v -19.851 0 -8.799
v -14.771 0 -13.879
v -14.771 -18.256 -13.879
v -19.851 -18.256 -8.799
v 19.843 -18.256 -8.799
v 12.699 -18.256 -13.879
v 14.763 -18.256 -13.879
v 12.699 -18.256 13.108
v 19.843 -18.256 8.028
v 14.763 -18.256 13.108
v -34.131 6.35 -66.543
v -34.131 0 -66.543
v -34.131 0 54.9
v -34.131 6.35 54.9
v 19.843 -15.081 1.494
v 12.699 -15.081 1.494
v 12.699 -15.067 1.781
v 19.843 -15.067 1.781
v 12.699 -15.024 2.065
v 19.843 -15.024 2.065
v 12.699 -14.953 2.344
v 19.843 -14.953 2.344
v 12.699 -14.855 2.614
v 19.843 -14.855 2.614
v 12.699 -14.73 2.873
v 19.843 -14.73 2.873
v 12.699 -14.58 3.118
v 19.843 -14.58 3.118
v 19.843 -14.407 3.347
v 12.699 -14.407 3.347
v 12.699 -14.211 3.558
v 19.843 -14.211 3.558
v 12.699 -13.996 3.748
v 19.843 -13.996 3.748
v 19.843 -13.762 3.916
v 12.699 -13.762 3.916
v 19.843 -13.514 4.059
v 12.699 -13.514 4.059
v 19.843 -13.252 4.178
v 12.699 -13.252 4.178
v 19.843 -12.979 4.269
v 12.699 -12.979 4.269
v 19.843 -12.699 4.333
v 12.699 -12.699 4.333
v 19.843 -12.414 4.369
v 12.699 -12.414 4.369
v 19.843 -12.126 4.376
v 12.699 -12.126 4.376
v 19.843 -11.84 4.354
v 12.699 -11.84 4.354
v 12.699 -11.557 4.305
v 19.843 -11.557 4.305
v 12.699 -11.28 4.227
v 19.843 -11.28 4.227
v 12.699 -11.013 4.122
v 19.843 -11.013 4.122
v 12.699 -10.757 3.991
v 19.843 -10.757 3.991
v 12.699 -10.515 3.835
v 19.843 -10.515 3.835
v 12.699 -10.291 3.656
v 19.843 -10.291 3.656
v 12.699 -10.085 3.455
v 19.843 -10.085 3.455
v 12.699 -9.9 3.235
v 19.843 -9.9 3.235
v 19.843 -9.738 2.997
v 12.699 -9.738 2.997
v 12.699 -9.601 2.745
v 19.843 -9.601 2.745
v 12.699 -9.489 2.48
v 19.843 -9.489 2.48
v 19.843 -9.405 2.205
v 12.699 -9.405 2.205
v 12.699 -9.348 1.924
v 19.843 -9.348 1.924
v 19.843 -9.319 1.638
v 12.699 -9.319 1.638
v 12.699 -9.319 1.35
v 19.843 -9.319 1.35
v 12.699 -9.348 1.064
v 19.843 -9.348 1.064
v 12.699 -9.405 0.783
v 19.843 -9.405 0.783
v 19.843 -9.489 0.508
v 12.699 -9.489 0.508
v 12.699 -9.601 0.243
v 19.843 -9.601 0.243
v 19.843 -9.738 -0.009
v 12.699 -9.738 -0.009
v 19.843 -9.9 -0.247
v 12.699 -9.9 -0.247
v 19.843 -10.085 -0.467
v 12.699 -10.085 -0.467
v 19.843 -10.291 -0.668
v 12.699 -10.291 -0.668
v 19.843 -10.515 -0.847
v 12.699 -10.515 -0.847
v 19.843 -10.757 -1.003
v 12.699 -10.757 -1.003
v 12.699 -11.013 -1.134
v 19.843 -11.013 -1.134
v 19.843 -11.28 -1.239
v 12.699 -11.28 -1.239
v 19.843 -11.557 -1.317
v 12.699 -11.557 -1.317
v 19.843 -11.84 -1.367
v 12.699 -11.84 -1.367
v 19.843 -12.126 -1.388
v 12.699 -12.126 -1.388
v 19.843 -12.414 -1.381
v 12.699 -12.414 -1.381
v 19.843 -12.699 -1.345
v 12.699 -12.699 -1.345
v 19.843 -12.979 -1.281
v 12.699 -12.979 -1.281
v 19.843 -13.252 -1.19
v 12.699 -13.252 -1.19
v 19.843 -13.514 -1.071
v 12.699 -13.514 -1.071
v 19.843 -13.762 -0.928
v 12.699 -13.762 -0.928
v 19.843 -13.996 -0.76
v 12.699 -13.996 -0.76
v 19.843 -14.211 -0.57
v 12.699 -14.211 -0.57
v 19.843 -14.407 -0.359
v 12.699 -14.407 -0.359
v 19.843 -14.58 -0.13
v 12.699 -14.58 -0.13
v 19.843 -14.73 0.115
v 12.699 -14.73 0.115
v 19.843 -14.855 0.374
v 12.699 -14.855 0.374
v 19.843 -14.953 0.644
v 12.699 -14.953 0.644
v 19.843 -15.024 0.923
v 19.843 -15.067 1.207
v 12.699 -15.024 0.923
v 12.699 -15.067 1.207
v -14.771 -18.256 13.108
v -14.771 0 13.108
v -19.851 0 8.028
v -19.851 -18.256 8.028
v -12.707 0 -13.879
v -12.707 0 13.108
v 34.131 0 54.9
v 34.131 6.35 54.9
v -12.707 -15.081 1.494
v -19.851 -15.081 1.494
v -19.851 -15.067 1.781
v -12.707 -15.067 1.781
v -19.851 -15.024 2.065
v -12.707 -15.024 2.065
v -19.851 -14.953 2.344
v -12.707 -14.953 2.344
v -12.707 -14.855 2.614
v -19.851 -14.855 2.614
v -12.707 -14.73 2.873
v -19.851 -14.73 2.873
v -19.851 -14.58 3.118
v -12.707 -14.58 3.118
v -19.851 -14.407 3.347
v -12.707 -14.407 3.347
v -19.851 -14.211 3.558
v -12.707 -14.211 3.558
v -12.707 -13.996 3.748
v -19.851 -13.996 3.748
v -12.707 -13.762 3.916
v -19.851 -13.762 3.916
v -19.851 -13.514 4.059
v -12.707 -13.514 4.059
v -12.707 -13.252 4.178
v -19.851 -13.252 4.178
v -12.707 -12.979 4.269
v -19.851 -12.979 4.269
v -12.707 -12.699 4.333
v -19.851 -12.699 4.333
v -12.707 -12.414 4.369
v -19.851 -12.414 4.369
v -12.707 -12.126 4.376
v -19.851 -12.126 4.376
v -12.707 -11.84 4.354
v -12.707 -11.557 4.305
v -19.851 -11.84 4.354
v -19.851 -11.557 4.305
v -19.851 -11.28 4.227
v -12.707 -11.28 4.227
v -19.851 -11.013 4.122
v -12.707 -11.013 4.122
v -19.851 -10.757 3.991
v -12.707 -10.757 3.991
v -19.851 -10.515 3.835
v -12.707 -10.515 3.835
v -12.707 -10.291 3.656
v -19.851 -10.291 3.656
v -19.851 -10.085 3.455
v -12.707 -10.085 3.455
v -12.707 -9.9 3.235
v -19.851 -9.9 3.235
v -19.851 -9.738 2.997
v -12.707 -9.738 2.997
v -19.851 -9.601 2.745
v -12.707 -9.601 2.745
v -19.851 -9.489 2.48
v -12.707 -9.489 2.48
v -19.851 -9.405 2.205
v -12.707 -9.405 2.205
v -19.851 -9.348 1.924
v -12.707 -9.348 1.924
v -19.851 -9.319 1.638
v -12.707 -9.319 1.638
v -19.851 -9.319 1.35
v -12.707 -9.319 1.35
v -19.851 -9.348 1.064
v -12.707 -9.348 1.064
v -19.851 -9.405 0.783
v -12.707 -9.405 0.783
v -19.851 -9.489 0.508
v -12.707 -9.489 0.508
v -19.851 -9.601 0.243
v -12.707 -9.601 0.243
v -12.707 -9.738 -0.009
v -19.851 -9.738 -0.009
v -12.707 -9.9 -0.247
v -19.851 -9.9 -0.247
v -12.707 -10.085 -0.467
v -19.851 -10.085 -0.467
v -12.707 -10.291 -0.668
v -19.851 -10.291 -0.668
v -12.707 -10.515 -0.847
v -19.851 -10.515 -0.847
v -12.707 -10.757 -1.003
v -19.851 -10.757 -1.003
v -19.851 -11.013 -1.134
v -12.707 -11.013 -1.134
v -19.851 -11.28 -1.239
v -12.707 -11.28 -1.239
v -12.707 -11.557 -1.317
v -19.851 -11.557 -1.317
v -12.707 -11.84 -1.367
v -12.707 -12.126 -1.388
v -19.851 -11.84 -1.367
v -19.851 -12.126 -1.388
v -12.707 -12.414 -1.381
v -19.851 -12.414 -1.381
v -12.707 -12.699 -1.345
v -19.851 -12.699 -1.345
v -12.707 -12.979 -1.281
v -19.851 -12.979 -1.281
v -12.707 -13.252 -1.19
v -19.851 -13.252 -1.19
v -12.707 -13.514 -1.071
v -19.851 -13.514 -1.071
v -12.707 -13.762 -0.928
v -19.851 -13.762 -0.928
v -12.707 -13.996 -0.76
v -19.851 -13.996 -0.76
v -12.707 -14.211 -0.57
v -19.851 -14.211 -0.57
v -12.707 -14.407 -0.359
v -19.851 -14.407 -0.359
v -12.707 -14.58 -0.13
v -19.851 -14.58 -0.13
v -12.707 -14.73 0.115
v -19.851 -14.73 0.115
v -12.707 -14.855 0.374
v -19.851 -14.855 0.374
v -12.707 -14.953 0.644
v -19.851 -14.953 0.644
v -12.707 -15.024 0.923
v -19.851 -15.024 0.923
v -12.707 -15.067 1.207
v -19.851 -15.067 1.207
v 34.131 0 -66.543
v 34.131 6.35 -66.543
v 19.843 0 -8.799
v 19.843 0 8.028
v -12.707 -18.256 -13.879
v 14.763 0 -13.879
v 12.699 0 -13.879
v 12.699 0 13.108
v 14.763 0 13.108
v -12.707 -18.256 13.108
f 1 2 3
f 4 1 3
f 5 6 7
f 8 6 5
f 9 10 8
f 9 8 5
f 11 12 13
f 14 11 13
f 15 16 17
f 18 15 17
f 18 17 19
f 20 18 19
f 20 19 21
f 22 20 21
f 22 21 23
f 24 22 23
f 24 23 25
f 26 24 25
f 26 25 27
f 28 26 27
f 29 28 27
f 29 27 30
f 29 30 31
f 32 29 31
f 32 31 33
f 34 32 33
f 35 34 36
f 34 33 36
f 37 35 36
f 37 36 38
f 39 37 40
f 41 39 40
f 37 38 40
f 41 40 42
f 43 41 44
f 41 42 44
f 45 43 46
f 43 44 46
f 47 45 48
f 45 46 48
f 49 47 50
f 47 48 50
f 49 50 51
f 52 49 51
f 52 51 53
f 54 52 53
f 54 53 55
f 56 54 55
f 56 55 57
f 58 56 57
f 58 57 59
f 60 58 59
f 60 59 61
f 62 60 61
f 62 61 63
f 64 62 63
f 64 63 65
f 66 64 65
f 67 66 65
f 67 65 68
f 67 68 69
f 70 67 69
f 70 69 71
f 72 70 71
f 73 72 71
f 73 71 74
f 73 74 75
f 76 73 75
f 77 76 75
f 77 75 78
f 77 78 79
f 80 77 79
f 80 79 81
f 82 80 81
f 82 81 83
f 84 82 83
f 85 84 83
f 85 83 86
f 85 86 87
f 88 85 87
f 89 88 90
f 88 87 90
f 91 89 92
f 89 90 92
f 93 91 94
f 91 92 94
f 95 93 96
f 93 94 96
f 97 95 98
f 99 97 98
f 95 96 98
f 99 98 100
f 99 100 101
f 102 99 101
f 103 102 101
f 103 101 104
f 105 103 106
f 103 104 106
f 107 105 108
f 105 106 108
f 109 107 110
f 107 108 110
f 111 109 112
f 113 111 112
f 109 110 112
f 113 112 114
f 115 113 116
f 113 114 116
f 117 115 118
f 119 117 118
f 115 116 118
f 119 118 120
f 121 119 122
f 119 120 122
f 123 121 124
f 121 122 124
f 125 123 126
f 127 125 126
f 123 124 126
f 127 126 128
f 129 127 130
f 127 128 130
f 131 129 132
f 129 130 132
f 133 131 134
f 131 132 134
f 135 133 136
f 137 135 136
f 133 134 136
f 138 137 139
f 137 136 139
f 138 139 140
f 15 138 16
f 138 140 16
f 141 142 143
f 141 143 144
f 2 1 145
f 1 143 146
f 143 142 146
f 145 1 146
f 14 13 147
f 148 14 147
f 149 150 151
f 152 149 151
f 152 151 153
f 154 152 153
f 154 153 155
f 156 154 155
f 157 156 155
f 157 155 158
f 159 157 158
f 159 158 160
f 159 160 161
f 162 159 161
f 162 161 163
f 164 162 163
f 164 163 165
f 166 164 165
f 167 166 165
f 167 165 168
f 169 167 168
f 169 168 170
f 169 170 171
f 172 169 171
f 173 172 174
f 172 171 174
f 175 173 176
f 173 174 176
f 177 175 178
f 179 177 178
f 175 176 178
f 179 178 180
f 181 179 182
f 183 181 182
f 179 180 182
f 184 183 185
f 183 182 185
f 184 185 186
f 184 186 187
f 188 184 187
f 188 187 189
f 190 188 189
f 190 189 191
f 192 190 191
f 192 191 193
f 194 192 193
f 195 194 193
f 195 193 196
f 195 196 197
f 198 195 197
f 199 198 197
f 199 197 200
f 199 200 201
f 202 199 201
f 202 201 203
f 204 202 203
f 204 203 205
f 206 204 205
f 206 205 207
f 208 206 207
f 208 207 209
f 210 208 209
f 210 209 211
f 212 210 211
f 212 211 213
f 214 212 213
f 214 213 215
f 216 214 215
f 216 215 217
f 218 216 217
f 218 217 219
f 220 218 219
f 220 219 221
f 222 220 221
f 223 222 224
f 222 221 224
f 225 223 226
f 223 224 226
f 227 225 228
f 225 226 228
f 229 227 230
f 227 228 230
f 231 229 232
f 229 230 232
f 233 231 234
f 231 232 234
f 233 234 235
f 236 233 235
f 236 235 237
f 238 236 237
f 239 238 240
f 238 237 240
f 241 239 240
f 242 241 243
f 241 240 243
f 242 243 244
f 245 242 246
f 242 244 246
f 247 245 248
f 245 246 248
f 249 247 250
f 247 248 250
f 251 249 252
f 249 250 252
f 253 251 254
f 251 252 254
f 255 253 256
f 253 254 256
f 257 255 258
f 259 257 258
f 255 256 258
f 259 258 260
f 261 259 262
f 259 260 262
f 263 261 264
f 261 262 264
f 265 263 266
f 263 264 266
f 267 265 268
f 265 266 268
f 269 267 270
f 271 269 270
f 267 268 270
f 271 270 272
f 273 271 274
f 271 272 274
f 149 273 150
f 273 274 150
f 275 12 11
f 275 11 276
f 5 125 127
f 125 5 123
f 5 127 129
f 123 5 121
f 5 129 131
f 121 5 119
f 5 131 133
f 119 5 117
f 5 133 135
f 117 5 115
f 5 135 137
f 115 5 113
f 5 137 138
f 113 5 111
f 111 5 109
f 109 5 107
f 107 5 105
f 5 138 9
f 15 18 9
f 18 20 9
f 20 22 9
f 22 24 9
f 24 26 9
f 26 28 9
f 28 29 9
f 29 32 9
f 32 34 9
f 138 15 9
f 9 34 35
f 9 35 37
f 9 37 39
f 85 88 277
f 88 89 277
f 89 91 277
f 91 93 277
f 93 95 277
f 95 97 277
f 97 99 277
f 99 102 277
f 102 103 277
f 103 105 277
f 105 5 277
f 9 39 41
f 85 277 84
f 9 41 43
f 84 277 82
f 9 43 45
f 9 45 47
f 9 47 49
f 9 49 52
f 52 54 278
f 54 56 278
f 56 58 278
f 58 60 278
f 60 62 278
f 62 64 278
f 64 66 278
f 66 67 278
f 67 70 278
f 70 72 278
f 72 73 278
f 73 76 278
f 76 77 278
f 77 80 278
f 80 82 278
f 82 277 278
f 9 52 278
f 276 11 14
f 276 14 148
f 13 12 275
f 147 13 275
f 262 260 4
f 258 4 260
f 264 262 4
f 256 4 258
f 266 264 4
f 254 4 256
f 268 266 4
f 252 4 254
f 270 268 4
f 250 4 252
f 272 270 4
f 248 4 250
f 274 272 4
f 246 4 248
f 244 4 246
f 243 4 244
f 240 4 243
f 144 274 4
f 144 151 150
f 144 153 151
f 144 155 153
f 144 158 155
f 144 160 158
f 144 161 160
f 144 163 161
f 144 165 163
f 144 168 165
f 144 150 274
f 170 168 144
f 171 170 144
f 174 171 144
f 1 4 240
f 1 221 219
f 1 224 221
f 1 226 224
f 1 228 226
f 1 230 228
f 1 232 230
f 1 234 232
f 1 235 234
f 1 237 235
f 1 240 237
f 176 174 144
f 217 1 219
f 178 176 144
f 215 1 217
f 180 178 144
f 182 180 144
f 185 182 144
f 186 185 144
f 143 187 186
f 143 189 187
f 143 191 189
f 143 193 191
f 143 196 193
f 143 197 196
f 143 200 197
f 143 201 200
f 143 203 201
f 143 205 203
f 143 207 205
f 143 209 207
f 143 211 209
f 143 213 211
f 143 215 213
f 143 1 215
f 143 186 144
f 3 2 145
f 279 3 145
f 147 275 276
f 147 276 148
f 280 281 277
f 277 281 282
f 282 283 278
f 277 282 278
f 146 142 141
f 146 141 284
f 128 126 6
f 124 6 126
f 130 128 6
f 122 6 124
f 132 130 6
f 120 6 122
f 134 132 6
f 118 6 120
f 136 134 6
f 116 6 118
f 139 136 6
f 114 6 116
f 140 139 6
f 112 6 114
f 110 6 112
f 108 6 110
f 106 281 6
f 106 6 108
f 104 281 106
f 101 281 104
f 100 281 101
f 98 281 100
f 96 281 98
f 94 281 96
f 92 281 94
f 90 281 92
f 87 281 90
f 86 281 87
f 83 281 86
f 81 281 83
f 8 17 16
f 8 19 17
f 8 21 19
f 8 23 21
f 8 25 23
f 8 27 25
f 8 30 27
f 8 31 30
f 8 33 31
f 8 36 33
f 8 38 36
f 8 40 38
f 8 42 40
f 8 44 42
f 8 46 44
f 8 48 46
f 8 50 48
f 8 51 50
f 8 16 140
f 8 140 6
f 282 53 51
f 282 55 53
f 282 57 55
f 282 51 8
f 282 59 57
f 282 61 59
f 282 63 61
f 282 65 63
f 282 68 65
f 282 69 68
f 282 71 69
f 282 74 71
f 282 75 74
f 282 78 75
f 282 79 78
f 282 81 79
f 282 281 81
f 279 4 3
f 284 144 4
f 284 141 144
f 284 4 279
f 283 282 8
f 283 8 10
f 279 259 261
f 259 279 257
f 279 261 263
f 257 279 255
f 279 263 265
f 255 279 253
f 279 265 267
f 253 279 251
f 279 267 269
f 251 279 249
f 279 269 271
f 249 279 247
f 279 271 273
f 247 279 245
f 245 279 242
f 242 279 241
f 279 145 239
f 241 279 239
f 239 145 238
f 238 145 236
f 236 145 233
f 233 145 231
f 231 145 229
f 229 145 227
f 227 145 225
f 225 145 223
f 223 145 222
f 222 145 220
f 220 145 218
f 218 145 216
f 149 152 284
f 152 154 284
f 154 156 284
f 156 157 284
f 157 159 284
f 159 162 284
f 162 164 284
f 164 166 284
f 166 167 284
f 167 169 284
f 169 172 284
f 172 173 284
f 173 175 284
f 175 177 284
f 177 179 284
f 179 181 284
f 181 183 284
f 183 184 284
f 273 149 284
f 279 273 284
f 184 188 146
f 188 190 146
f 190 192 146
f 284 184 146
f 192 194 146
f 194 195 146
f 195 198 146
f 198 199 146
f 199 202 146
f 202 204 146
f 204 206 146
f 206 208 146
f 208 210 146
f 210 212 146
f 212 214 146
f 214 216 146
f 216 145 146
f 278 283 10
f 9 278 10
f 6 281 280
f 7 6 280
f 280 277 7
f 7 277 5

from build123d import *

# Parameters (mm, degrees)
F1_W      = 7.14375
F1_H      = 26.9875
F2_DEPTH  = 18.25625
F3_SIZE   = 5.08
F3_2_SIZE = 5.08
F4_R      = 2.8829
F5_DEPTH  = 50.8
F0_W      = 68.2625
F0_H      = 121.44375
F6_DEPTH  = 6.35


# Not quite as in the source:
# - a length typed as a fraction of an inch, garbled in the dataset ("3 / 203.2 mm" for 3/8 in), is restored


with BuildPart() as f2:
    # F1 (on Front) → F2 (new body)
    with BuildSketch(Plane.XZ):
        with Locations((16.2713638617, -0.3856395021)):
            Rectangle(F1_W, F1_H)
    extrude(amount=F2_DEPTH)

    # F3#2
    f3_2_edges = [f2.edges().sort_by_distance(p)[0] for p in [
        (19.843239, -9.128125, 13.10811),
        (19.843239, -9.128125, -13.87939),
    ]]
    chamfer(f3_2_edges, length=F3_2_SIZE)


with BuildPart() as f2b:
    # F1 (on Front) → F2, piece 2 (new body)
    with BuildSketch(Plane.XZ):
        with Locations((-16.2787499154, -0.3856395021)):
            Rectangle(F1_W, F1_H)
    extrude(amount=F2_DEPTH)

    # F3
    f3_edges = [f2b.edges().sort_by_distance(p)[0] for p in [
        (-19.850625, -9.128125, 13.10811),
        (-19.850625, -9.128125, -13.87939),
    ]]
    chamfer(f3_edges, length=F3_SIZE)


with BuildPart() as f5_tool:
    # F4 (on face) → F5 (new body)
    with BuildSketch(Plane(origin=(-19.8506249154, 0, 0), x_dir=(0, -1, 0), z_dir=(-1, 0, 0))):
        with Locations((12.19835, 1.4939604979)):
            Circle(F4_R)
    extrude(amount=-F5_DEPTH)


with BuildPart() as f2_1:
    add(f2.part)

    # F5: cut by f5_tool
    add(f5_tool.part, mode=Mode.SUBTRACT)


with BuildPart() as f2b_1:
    add(f2b.part)

    # F5: cut by f5_tool
    add(f5_tool.part, mode=Mode.SUBTRACT)


with BuildPart() as f6:
    # F0 (on Front) → F6 (new body)
    with BuildSketch(Plane.XZ):
        with Locations((0, -5.8215066612)):
            Rectangle(F0_W, F0_H)
    extrude(amount=-F6_DEPTH)


solid = Compound([f2_1.part, f2b_1.part, f6.part])
